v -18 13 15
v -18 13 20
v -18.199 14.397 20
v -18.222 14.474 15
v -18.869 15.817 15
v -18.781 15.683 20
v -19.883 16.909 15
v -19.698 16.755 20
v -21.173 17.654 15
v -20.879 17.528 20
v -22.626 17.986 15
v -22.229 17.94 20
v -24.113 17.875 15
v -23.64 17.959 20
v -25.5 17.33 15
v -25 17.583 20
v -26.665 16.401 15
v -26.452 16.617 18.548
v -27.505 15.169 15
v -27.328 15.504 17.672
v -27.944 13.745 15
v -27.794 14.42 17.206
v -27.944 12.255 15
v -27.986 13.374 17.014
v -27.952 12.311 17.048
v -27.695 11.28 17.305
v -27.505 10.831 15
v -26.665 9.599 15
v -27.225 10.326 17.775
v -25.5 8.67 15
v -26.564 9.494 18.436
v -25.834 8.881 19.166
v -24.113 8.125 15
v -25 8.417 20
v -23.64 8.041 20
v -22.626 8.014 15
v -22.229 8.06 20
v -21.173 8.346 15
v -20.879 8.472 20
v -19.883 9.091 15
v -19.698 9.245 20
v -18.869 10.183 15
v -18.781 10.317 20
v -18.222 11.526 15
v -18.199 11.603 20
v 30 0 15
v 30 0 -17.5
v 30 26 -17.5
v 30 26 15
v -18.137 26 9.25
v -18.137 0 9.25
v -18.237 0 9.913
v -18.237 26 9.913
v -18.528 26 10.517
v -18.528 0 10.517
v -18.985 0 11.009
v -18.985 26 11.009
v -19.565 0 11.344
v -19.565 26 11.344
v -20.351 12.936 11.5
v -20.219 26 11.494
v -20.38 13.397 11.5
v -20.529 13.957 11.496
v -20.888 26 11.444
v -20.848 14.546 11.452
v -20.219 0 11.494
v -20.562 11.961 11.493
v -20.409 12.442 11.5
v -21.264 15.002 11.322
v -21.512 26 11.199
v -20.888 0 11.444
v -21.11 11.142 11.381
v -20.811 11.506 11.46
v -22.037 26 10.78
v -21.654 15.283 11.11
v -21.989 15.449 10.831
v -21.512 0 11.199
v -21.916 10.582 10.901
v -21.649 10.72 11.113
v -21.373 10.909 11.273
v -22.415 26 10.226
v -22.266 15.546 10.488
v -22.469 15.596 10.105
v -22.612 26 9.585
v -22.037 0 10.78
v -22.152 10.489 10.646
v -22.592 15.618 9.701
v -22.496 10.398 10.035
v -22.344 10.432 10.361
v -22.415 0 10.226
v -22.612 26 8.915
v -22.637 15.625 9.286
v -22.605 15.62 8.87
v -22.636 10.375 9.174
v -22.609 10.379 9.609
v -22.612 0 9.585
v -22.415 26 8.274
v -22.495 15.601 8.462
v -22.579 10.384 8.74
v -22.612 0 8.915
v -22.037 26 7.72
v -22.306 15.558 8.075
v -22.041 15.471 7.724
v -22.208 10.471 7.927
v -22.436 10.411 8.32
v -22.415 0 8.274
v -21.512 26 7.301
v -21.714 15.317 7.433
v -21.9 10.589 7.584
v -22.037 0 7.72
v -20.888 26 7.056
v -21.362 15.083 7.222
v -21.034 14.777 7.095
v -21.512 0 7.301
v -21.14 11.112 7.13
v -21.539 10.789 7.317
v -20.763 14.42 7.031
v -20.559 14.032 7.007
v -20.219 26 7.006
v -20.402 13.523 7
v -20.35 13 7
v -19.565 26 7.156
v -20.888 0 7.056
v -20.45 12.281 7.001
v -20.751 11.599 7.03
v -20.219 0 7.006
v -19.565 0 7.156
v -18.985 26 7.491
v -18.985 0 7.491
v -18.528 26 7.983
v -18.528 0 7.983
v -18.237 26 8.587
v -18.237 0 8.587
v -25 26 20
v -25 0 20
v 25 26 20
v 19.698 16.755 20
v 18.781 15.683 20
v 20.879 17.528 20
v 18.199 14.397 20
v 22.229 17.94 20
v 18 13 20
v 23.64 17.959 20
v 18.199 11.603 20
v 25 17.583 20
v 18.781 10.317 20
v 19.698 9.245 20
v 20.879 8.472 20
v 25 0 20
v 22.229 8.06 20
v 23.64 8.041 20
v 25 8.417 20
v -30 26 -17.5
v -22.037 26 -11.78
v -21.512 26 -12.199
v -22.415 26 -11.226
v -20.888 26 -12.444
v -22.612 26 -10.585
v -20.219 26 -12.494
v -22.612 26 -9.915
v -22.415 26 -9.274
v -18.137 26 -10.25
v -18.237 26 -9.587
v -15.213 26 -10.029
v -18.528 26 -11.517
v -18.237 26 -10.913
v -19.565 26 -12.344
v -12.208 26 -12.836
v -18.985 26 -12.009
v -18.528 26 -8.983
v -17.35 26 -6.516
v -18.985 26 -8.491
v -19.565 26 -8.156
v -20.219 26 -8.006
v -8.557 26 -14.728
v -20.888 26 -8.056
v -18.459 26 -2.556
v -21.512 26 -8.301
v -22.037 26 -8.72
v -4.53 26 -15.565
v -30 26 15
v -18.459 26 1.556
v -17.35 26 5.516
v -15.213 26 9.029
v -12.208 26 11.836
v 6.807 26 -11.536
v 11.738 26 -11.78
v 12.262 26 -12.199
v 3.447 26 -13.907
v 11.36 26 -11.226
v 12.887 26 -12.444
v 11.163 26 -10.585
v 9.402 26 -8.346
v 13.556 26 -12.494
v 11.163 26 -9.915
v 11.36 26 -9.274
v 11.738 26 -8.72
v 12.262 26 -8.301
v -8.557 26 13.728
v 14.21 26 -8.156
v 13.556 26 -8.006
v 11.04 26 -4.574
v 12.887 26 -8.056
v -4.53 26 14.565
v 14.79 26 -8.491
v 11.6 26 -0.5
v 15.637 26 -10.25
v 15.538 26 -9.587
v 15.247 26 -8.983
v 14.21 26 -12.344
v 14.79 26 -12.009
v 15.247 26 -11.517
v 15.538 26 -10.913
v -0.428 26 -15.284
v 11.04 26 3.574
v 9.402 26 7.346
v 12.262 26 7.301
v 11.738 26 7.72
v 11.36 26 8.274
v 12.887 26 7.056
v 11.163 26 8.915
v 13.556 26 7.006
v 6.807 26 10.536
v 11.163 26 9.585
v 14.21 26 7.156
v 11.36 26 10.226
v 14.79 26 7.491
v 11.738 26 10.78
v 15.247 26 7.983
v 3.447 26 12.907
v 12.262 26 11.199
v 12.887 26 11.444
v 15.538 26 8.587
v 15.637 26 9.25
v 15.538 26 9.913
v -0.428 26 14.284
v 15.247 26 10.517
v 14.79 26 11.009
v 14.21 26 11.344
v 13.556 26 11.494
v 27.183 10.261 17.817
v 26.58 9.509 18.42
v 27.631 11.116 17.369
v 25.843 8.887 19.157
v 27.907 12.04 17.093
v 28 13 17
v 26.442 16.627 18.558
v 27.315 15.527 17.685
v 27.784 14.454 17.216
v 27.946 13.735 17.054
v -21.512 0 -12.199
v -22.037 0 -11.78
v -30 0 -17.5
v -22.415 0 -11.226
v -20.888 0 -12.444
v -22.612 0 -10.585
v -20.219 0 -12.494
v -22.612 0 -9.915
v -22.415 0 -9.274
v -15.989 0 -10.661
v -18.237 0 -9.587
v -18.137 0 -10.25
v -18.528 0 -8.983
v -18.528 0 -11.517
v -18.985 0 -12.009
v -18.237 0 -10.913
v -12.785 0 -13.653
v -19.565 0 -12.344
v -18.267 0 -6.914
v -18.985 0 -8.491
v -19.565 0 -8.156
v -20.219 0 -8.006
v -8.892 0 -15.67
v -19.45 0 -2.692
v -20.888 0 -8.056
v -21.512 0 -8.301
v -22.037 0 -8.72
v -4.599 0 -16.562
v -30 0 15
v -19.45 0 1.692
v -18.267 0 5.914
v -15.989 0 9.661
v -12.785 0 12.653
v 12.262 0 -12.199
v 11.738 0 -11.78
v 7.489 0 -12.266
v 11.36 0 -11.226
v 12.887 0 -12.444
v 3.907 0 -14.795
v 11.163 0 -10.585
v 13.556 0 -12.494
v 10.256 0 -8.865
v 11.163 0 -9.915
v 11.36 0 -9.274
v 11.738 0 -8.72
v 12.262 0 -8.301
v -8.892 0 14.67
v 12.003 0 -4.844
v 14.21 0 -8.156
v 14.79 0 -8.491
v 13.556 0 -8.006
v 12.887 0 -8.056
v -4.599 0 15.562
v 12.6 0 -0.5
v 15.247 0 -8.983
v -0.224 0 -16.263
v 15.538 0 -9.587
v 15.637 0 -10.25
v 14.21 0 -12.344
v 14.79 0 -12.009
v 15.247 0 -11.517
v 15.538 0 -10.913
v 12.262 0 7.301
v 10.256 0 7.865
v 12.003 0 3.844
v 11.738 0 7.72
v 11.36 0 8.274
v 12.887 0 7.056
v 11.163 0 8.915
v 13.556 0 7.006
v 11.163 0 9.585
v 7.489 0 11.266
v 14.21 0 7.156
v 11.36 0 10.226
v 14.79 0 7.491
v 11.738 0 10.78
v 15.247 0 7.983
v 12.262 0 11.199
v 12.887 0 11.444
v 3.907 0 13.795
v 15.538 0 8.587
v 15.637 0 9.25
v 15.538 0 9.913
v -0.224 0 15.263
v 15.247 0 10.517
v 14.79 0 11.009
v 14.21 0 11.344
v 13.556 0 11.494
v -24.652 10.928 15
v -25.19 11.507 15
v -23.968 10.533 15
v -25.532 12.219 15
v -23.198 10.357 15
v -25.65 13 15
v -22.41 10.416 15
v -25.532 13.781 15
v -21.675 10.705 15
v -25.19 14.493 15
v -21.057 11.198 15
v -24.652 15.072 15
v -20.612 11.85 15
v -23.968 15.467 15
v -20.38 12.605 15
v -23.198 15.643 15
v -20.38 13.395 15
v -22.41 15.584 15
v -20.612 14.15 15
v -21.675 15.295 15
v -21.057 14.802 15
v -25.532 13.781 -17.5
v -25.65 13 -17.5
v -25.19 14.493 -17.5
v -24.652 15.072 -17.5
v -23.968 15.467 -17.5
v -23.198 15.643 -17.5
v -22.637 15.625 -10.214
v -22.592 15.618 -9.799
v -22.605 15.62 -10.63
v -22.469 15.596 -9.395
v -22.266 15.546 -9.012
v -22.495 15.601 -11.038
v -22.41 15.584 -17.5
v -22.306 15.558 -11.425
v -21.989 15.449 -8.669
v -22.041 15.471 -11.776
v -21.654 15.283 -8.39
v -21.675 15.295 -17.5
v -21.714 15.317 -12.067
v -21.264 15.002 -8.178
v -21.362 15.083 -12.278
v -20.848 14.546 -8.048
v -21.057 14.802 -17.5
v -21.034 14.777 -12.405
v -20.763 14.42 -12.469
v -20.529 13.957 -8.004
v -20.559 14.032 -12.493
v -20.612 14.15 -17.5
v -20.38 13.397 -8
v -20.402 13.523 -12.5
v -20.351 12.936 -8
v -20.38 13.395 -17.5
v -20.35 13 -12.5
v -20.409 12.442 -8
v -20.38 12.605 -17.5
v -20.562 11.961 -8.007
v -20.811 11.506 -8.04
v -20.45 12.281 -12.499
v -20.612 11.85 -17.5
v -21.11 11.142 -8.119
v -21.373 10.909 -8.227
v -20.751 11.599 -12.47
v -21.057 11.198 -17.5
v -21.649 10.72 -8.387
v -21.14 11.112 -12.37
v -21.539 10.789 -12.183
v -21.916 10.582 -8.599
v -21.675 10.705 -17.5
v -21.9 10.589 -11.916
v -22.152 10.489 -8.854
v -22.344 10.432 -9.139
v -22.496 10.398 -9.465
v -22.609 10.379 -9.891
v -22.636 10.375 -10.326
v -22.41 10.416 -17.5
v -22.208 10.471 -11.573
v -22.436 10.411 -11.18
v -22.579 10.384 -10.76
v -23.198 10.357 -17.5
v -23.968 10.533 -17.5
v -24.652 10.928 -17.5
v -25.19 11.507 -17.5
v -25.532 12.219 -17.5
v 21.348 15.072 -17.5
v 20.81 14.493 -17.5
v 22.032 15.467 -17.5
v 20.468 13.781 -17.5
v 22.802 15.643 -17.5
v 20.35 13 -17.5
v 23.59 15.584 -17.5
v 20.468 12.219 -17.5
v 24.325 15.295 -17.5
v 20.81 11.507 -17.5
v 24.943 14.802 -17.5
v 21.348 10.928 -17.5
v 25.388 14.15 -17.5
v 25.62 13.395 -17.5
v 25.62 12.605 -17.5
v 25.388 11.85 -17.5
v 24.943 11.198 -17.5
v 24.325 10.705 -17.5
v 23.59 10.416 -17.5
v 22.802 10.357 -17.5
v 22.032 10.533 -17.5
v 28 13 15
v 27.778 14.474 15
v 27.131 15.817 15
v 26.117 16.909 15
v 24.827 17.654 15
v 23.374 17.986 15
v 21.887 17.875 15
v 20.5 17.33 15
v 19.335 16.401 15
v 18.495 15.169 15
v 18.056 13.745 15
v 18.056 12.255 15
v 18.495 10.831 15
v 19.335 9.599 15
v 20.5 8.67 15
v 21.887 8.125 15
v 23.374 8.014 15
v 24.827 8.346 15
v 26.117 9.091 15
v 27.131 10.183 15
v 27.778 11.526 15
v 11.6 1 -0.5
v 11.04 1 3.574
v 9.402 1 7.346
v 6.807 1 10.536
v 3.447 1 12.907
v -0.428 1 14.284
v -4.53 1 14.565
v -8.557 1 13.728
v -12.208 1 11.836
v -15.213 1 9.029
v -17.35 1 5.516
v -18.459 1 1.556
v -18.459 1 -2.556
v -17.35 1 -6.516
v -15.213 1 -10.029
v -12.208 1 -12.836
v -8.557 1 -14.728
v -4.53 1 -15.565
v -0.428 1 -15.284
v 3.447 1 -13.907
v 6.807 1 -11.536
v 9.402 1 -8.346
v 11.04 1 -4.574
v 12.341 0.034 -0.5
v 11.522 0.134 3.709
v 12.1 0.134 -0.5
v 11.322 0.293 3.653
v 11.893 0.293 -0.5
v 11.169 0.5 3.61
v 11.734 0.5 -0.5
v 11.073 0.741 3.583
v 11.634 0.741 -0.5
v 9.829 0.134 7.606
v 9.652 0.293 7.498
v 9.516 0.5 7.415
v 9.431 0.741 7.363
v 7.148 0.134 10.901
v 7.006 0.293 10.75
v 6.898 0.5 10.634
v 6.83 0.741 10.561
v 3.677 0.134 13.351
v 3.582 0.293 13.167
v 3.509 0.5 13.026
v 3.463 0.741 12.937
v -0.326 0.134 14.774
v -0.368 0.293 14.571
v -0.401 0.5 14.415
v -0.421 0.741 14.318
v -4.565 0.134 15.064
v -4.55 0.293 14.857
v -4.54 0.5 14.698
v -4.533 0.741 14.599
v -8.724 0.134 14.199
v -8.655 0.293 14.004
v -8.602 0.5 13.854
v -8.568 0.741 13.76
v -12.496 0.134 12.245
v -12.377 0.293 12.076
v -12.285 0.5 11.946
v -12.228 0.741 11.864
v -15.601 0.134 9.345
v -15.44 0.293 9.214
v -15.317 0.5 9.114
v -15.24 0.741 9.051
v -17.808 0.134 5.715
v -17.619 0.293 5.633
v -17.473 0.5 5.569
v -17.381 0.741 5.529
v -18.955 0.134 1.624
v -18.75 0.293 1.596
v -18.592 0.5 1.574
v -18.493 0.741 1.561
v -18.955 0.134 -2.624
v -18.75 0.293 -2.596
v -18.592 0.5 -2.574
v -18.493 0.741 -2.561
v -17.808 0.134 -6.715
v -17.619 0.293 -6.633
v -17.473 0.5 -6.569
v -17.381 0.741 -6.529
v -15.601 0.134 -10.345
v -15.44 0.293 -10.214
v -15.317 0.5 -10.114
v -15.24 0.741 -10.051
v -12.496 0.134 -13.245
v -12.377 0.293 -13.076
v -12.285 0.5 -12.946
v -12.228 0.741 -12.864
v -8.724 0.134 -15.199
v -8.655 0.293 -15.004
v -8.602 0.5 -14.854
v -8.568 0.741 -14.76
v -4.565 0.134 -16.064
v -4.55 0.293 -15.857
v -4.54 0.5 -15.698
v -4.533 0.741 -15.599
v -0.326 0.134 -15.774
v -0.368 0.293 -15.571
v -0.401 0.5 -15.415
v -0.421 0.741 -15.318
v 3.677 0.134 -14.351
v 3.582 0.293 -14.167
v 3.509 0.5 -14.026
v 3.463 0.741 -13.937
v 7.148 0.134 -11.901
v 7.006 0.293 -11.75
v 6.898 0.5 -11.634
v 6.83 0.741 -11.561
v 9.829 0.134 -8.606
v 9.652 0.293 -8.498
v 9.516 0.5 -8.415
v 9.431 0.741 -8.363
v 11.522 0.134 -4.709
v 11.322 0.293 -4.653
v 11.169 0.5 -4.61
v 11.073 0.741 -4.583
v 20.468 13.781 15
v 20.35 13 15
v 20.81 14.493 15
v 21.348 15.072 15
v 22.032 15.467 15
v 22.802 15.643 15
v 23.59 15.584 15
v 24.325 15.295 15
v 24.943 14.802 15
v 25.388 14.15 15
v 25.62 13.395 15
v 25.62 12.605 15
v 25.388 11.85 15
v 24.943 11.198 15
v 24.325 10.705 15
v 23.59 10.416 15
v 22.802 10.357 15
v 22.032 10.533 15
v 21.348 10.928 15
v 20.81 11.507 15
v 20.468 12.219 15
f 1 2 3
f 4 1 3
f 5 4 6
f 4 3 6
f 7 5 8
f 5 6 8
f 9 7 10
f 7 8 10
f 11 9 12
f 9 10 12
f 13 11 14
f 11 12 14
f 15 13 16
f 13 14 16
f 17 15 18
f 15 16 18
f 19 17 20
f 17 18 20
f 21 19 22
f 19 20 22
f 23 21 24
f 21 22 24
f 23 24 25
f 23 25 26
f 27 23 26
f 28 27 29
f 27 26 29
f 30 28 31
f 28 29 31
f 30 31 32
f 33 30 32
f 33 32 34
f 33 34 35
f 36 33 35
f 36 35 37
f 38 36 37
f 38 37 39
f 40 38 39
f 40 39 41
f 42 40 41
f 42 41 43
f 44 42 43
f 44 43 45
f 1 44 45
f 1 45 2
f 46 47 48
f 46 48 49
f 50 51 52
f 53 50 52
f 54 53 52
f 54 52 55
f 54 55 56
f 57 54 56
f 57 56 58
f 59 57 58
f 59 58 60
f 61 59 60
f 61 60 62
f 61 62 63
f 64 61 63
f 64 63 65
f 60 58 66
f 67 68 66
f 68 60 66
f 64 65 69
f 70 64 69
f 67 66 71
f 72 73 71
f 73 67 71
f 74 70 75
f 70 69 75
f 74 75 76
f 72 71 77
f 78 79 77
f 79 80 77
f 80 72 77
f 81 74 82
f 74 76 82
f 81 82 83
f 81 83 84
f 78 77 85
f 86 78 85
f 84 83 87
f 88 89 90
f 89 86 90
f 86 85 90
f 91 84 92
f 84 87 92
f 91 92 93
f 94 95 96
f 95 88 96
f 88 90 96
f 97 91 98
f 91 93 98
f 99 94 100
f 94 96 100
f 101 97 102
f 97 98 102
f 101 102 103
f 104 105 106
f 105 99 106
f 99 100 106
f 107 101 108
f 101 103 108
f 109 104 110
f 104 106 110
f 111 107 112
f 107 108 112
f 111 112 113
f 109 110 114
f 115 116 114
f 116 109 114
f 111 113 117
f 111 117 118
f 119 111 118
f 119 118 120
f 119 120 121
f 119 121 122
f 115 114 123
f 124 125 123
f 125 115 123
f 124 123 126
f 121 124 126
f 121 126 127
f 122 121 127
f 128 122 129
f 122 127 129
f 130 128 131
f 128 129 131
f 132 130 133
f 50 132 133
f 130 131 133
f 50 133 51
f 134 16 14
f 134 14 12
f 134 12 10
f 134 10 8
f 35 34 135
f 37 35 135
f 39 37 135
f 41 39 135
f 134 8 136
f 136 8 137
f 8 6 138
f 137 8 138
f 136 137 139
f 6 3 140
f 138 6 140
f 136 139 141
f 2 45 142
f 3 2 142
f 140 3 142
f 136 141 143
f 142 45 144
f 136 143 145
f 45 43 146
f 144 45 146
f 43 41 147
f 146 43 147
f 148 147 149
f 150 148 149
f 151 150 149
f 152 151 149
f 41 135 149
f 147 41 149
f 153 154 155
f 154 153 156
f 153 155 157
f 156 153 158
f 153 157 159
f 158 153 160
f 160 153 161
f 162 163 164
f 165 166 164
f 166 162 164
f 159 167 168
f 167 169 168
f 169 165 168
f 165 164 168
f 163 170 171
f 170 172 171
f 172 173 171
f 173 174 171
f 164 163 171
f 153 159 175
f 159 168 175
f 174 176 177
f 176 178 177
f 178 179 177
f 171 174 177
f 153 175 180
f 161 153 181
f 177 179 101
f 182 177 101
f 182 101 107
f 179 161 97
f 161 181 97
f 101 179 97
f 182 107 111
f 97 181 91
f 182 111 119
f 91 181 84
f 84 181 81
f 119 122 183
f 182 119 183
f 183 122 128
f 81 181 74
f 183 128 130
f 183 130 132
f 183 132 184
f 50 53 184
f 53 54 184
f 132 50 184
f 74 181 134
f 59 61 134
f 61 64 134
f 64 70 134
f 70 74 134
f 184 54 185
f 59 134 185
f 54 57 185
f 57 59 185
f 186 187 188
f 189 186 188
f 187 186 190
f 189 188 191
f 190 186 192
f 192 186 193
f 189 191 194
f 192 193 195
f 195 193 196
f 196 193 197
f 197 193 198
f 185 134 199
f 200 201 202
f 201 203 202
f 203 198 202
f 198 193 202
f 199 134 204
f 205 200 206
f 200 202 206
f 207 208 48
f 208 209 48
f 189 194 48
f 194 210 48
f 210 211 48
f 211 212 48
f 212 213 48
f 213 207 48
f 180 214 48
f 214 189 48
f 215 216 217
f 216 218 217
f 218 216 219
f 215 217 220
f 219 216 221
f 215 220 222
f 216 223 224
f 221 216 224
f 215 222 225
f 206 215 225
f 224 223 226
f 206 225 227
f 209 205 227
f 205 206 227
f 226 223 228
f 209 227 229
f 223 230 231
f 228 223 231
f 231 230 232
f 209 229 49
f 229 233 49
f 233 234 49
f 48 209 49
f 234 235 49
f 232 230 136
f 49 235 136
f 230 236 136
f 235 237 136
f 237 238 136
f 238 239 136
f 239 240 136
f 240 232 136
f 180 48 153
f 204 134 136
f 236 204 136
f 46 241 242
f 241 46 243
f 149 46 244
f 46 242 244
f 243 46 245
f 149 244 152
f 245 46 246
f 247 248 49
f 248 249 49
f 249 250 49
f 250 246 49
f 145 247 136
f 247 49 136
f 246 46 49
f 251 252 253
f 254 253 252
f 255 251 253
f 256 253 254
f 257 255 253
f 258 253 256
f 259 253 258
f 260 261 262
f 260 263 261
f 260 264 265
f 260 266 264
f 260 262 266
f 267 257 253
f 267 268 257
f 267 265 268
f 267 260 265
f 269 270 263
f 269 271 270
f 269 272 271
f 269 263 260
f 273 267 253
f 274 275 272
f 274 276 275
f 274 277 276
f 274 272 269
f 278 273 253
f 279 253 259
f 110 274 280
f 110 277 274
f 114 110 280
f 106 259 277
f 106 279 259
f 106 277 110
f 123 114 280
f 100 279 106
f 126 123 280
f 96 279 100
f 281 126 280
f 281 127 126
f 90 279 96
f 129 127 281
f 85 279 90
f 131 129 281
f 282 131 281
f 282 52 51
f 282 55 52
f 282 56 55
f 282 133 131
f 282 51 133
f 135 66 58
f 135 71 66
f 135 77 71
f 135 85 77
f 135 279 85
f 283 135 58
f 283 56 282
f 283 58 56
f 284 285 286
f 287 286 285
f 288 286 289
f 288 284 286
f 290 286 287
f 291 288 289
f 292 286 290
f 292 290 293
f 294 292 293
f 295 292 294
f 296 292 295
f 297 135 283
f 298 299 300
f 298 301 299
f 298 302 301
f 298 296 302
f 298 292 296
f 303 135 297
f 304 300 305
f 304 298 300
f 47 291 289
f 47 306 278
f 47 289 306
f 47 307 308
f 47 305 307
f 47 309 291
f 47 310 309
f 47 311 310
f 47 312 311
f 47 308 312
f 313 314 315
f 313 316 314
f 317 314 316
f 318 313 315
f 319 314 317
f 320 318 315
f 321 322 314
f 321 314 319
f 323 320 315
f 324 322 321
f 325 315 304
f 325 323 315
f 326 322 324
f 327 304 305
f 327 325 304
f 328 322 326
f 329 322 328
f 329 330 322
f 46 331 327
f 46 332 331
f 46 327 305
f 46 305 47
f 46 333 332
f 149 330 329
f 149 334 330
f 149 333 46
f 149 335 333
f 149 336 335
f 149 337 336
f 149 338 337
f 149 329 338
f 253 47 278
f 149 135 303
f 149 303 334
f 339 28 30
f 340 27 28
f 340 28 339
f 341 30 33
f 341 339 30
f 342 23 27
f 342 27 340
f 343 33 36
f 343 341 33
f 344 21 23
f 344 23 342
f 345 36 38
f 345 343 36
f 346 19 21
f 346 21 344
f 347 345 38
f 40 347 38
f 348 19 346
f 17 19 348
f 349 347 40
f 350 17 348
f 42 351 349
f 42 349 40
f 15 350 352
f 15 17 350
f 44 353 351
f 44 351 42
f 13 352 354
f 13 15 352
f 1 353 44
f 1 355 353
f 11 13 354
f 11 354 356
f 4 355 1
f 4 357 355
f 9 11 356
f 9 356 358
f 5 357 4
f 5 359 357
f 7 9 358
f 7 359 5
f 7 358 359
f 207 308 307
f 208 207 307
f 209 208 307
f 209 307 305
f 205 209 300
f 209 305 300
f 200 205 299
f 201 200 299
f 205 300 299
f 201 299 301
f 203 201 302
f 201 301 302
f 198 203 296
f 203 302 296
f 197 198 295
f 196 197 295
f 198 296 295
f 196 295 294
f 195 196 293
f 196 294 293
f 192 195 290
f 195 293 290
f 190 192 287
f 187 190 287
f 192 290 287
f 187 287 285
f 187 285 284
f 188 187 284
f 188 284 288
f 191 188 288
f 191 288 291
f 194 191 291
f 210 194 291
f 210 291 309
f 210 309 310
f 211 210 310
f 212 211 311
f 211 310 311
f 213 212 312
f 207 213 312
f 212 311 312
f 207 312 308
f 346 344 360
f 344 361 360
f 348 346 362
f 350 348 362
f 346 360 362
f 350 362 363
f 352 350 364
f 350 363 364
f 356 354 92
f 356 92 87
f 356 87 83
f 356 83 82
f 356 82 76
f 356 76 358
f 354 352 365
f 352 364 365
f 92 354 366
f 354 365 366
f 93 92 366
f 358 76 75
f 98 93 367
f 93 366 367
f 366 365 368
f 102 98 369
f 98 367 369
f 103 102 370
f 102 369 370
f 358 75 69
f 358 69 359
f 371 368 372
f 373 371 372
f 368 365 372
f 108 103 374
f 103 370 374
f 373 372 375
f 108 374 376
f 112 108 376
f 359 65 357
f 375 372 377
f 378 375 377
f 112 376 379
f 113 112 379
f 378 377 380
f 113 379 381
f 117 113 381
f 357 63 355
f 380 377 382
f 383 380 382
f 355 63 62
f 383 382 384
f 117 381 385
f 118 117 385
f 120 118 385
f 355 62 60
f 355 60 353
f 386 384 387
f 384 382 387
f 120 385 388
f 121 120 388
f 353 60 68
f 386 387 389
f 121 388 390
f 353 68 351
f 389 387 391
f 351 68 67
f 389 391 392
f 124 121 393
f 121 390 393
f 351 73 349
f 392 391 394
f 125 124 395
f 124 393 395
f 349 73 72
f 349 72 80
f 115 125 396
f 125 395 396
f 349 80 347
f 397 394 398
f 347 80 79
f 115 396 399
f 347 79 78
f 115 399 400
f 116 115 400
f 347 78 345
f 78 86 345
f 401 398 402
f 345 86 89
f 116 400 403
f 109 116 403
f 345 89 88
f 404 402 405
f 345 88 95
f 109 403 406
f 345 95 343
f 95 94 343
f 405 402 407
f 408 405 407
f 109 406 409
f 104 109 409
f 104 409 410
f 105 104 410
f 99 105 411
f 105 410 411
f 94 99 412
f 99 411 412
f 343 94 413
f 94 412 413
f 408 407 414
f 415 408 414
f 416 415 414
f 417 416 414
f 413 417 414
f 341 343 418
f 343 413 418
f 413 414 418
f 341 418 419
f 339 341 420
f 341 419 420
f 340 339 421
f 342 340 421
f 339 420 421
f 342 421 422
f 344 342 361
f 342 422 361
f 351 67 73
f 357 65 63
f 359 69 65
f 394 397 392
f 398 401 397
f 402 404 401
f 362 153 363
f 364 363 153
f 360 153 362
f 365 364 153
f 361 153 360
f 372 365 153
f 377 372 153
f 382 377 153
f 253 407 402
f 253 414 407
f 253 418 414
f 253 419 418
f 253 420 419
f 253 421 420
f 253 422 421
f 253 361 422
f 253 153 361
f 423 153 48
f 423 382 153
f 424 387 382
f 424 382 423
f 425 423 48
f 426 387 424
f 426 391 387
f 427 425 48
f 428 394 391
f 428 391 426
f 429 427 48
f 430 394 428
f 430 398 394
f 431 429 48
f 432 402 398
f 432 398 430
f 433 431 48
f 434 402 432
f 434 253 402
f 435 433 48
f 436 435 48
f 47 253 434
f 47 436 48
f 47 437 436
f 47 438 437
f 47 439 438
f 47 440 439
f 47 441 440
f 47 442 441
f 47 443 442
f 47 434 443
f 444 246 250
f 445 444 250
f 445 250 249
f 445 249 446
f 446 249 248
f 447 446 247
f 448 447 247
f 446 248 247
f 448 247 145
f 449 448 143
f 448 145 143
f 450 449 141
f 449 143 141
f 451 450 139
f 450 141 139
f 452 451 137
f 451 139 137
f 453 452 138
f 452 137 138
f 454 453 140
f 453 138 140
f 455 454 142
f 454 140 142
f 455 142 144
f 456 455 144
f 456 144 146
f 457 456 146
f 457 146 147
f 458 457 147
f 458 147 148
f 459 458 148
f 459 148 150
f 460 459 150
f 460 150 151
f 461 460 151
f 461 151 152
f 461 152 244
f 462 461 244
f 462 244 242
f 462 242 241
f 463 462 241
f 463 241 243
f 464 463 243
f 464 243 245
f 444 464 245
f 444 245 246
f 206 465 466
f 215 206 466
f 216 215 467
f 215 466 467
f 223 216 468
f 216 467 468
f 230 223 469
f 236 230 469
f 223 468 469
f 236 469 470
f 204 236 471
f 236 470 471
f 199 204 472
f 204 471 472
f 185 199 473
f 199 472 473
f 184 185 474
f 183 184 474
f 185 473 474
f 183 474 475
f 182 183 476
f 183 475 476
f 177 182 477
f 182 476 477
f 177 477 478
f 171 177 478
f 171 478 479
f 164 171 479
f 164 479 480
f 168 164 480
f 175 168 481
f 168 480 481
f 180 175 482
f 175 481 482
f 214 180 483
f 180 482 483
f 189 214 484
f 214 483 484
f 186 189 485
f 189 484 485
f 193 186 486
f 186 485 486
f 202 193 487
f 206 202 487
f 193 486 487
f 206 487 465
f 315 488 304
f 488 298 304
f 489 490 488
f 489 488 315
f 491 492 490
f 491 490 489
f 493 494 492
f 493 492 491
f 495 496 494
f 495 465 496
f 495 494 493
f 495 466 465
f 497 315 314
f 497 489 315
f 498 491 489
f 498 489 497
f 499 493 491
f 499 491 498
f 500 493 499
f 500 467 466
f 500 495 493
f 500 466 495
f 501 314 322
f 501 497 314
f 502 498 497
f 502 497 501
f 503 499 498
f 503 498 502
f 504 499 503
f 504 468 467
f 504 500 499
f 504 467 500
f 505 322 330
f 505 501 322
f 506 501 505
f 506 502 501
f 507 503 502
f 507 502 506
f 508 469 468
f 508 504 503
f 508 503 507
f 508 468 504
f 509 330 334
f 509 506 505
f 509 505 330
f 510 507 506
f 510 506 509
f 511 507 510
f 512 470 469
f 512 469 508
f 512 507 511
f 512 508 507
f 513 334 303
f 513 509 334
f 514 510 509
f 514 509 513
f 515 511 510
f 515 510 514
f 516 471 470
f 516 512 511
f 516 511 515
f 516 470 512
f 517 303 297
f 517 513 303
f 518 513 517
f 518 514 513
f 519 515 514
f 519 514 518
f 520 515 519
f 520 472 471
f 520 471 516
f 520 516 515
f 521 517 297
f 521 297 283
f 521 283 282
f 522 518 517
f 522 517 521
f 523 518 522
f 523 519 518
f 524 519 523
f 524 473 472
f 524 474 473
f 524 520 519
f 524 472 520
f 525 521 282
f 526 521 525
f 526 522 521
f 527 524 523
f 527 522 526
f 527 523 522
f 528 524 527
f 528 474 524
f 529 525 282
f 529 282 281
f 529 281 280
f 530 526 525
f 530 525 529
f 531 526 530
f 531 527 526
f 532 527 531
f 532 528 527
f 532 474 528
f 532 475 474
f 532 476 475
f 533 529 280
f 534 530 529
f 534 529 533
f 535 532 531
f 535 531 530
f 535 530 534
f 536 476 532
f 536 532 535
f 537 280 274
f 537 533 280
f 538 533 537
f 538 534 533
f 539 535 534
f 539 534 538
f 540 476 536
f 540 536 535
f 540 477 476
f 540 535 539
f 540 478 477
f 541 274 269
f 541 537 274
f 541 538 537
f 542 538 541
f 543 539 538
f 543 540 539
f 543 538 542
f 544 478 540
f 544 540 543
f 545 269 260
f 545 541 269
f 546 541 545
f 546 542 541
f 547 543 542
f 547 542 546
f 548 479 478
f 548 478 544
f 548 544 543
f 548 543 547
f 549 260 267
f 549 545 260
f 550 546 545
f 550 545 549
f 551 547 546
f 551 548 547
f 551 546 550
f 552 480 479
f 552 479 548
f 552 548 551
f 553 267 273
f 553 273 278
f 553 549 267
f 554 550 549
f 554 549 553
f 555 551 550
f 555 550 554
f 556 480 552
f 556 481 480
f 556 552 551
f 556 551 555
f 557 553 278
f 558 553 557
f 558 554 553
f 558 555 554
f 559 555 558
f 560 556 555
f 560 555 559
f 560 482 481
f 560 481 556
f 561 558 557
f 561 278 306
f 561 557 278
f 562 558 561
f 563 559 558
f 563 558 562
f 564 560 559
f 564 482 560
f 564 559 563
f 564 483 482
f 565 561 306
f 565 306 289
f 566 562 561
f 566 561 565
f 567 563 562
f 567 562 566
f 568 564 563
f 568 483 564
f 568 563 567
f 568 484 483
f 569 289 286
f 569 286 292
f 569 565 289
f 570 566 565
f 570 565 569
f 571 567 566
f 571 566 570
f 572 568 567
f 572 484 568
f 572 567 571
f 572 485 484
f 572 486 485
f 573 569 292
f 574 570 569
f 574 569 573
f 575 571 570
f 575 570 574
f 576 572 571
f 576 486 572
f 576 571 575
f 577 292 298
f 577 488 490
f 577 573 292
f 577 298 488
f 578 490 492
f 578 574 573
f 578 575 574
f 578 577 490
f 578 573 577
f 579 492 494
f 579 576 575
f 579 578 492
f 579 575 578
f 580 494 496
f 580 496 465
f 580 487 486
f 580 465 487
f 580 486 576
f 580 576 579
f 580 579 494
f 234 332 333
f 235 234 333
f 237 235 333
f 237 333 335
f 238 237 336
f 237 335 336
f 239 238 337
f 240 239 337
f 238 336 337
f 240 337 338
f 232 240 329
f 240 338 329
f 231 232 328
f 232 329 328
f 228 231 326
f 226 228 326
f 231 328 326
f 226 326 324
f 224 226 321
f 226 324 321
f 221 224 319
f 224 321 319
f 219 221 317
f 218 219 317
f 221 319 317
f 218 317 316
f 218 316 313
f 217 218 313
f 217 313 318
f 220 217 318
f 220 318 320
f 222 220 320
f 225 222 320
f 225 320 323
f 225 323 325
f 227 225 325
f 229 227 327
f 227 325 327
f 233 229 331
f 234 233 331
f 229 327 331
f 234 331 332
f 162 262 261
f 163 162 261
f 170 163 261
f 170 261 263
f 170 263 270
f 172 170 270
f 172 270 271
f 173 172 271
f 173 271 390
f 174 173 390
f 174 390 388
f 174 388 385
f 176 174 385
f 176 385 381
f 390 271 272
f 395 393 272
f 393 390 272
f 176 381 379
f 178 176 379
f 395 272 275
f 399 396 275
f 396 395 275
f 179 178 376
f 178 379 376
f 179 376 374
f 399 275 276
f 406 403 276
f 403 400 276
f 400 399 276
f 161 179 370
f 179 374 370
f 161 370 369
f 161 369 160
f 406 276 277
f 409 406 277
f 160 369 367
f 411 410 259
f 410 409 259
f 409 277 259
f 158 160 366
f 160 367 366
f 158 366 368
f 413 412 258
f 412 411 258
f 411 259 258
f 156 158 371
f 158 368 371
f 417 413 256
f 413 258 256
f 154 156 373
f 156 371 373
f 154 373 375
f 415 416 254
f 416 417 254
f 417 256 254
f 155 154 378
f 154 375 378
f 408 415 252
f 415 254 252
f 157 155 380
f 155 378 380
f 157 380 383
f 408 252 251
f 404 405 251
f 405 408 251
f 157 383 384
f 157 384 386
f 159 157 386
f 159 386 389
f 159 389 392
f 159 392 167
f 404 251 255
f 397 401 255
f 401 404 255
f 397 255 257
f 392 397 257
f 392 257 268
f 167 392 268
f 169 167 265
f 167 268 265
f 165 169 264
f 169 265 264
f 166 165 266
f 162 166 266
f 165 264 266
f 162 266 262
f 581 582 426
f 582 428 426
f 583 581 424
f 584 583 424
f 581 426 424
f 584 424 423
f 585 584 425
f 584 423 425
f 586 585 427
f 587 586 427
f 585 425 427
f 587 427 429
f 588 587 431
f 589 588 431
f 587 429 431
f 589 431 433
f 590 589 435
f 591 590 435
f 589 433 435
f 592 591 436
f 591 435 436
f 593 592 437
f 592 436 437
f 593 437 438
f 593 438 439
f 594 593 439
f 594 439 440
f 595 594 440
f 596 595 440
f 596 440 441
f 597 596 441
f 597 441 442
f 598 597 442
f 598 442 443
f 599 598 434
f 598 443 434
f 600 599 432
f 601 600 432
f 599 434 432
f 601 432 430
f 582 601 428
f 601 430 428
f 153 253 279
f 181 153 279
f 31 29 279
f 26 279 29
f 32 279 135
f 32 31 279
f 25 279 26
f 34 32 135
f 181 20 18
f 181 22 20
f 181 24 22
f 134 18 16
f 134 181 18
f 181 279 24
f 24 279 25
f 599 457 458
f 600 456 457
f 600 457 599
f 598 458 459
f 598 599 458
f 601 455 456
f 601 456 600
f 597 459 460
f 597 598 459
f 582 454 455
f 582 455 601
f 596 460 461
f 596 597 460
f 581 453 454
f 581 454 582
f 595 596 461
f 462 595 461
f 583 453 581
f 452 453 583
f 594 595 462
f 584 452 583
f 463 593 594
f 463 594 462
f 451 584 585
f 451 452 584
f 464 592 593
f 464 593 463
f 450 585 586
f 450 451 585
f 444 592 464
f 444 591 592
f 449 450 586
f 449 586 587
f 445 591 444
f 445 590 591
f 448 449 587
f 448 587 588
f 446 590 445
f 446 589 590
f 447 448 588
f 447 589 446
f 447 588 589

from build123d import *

# Parameters (mm, degrees)
F0_W           = 60
F0_H           = 37.5
F0_R           = 2.25
F0_R_2         = 15.1
F1_DEPTH       = 26
F3_D           = 5.3
F3_CBORE_D     = 10
F3_CBORE_DEPTH = 5
F4_T1_DEPTH    = 51.7168298797
F5_R           = 1


# Not quite as in the source:
# - a fillet or chamfer that OpenCascade refuses, or shapes differently, is made with other operations: its cross-section is extruded or revolved along the edge and cut away or added


with BuildPart() as f1:
    # F0 (on Front) → F1 (new body)
    with BuildSketch(Plane.XZ):
        with Locations((0, 1.25)):
            Rectangle(F0_W, F0_H)
        with Locations((-20.3874953738, -10.25)):
            Circle(F0_R, mode=Mode.SUBTRACT)
        with Locations((-3.5, -0.5)):
            Circle(F0_R_2, mode=Mode.SUBTRACT)
        with Locations((13.3874953738, -10.25)):
            Circle(F0_R, mode=Mode.SUBTRACT)
        with Locations((-20.3874953738, 9.25)):
            Circle(F0_R, mode=Mode.SUBTRACT)
        with Locations((13.3874953738, 9.25)):
            Circle(F0_R, mode=Mode.SUBTRACT)
    extrude(amount=-F1_DEPTH)

    # F3 (through all)
    with Locations(Plane.XY.offset(20)):
        with Locations((-23, 13), (23, 13)):
            CounterBoreHole(F3_D / 2, F3_CBORE_D / 2, F3_CBORE_DEPTH)

    # F4: chamfer of 5 on 2 edges, made by hand

    # F4_s2 → F4_t1 (cut)
    with BuildSketch(Plane.XZ.offset(-38.8584149398)):
        Polygon((-30, 15), (-25, 20), (-30, 20), align=None)
        Polygon((30, 15), (25, 20), (30, 20), align=None)
    extrude(amount=F4_T1_DEPTH, mode=Mode.SUBTRACT)

    # F5
    f5_edges = [f1.edges().sort_by_distance(p)[0] for p in [
        (-18.6, 0, -0.5),
    ]]
    fillet(f5_edges, radius=F5_R)


solid = f1.part
